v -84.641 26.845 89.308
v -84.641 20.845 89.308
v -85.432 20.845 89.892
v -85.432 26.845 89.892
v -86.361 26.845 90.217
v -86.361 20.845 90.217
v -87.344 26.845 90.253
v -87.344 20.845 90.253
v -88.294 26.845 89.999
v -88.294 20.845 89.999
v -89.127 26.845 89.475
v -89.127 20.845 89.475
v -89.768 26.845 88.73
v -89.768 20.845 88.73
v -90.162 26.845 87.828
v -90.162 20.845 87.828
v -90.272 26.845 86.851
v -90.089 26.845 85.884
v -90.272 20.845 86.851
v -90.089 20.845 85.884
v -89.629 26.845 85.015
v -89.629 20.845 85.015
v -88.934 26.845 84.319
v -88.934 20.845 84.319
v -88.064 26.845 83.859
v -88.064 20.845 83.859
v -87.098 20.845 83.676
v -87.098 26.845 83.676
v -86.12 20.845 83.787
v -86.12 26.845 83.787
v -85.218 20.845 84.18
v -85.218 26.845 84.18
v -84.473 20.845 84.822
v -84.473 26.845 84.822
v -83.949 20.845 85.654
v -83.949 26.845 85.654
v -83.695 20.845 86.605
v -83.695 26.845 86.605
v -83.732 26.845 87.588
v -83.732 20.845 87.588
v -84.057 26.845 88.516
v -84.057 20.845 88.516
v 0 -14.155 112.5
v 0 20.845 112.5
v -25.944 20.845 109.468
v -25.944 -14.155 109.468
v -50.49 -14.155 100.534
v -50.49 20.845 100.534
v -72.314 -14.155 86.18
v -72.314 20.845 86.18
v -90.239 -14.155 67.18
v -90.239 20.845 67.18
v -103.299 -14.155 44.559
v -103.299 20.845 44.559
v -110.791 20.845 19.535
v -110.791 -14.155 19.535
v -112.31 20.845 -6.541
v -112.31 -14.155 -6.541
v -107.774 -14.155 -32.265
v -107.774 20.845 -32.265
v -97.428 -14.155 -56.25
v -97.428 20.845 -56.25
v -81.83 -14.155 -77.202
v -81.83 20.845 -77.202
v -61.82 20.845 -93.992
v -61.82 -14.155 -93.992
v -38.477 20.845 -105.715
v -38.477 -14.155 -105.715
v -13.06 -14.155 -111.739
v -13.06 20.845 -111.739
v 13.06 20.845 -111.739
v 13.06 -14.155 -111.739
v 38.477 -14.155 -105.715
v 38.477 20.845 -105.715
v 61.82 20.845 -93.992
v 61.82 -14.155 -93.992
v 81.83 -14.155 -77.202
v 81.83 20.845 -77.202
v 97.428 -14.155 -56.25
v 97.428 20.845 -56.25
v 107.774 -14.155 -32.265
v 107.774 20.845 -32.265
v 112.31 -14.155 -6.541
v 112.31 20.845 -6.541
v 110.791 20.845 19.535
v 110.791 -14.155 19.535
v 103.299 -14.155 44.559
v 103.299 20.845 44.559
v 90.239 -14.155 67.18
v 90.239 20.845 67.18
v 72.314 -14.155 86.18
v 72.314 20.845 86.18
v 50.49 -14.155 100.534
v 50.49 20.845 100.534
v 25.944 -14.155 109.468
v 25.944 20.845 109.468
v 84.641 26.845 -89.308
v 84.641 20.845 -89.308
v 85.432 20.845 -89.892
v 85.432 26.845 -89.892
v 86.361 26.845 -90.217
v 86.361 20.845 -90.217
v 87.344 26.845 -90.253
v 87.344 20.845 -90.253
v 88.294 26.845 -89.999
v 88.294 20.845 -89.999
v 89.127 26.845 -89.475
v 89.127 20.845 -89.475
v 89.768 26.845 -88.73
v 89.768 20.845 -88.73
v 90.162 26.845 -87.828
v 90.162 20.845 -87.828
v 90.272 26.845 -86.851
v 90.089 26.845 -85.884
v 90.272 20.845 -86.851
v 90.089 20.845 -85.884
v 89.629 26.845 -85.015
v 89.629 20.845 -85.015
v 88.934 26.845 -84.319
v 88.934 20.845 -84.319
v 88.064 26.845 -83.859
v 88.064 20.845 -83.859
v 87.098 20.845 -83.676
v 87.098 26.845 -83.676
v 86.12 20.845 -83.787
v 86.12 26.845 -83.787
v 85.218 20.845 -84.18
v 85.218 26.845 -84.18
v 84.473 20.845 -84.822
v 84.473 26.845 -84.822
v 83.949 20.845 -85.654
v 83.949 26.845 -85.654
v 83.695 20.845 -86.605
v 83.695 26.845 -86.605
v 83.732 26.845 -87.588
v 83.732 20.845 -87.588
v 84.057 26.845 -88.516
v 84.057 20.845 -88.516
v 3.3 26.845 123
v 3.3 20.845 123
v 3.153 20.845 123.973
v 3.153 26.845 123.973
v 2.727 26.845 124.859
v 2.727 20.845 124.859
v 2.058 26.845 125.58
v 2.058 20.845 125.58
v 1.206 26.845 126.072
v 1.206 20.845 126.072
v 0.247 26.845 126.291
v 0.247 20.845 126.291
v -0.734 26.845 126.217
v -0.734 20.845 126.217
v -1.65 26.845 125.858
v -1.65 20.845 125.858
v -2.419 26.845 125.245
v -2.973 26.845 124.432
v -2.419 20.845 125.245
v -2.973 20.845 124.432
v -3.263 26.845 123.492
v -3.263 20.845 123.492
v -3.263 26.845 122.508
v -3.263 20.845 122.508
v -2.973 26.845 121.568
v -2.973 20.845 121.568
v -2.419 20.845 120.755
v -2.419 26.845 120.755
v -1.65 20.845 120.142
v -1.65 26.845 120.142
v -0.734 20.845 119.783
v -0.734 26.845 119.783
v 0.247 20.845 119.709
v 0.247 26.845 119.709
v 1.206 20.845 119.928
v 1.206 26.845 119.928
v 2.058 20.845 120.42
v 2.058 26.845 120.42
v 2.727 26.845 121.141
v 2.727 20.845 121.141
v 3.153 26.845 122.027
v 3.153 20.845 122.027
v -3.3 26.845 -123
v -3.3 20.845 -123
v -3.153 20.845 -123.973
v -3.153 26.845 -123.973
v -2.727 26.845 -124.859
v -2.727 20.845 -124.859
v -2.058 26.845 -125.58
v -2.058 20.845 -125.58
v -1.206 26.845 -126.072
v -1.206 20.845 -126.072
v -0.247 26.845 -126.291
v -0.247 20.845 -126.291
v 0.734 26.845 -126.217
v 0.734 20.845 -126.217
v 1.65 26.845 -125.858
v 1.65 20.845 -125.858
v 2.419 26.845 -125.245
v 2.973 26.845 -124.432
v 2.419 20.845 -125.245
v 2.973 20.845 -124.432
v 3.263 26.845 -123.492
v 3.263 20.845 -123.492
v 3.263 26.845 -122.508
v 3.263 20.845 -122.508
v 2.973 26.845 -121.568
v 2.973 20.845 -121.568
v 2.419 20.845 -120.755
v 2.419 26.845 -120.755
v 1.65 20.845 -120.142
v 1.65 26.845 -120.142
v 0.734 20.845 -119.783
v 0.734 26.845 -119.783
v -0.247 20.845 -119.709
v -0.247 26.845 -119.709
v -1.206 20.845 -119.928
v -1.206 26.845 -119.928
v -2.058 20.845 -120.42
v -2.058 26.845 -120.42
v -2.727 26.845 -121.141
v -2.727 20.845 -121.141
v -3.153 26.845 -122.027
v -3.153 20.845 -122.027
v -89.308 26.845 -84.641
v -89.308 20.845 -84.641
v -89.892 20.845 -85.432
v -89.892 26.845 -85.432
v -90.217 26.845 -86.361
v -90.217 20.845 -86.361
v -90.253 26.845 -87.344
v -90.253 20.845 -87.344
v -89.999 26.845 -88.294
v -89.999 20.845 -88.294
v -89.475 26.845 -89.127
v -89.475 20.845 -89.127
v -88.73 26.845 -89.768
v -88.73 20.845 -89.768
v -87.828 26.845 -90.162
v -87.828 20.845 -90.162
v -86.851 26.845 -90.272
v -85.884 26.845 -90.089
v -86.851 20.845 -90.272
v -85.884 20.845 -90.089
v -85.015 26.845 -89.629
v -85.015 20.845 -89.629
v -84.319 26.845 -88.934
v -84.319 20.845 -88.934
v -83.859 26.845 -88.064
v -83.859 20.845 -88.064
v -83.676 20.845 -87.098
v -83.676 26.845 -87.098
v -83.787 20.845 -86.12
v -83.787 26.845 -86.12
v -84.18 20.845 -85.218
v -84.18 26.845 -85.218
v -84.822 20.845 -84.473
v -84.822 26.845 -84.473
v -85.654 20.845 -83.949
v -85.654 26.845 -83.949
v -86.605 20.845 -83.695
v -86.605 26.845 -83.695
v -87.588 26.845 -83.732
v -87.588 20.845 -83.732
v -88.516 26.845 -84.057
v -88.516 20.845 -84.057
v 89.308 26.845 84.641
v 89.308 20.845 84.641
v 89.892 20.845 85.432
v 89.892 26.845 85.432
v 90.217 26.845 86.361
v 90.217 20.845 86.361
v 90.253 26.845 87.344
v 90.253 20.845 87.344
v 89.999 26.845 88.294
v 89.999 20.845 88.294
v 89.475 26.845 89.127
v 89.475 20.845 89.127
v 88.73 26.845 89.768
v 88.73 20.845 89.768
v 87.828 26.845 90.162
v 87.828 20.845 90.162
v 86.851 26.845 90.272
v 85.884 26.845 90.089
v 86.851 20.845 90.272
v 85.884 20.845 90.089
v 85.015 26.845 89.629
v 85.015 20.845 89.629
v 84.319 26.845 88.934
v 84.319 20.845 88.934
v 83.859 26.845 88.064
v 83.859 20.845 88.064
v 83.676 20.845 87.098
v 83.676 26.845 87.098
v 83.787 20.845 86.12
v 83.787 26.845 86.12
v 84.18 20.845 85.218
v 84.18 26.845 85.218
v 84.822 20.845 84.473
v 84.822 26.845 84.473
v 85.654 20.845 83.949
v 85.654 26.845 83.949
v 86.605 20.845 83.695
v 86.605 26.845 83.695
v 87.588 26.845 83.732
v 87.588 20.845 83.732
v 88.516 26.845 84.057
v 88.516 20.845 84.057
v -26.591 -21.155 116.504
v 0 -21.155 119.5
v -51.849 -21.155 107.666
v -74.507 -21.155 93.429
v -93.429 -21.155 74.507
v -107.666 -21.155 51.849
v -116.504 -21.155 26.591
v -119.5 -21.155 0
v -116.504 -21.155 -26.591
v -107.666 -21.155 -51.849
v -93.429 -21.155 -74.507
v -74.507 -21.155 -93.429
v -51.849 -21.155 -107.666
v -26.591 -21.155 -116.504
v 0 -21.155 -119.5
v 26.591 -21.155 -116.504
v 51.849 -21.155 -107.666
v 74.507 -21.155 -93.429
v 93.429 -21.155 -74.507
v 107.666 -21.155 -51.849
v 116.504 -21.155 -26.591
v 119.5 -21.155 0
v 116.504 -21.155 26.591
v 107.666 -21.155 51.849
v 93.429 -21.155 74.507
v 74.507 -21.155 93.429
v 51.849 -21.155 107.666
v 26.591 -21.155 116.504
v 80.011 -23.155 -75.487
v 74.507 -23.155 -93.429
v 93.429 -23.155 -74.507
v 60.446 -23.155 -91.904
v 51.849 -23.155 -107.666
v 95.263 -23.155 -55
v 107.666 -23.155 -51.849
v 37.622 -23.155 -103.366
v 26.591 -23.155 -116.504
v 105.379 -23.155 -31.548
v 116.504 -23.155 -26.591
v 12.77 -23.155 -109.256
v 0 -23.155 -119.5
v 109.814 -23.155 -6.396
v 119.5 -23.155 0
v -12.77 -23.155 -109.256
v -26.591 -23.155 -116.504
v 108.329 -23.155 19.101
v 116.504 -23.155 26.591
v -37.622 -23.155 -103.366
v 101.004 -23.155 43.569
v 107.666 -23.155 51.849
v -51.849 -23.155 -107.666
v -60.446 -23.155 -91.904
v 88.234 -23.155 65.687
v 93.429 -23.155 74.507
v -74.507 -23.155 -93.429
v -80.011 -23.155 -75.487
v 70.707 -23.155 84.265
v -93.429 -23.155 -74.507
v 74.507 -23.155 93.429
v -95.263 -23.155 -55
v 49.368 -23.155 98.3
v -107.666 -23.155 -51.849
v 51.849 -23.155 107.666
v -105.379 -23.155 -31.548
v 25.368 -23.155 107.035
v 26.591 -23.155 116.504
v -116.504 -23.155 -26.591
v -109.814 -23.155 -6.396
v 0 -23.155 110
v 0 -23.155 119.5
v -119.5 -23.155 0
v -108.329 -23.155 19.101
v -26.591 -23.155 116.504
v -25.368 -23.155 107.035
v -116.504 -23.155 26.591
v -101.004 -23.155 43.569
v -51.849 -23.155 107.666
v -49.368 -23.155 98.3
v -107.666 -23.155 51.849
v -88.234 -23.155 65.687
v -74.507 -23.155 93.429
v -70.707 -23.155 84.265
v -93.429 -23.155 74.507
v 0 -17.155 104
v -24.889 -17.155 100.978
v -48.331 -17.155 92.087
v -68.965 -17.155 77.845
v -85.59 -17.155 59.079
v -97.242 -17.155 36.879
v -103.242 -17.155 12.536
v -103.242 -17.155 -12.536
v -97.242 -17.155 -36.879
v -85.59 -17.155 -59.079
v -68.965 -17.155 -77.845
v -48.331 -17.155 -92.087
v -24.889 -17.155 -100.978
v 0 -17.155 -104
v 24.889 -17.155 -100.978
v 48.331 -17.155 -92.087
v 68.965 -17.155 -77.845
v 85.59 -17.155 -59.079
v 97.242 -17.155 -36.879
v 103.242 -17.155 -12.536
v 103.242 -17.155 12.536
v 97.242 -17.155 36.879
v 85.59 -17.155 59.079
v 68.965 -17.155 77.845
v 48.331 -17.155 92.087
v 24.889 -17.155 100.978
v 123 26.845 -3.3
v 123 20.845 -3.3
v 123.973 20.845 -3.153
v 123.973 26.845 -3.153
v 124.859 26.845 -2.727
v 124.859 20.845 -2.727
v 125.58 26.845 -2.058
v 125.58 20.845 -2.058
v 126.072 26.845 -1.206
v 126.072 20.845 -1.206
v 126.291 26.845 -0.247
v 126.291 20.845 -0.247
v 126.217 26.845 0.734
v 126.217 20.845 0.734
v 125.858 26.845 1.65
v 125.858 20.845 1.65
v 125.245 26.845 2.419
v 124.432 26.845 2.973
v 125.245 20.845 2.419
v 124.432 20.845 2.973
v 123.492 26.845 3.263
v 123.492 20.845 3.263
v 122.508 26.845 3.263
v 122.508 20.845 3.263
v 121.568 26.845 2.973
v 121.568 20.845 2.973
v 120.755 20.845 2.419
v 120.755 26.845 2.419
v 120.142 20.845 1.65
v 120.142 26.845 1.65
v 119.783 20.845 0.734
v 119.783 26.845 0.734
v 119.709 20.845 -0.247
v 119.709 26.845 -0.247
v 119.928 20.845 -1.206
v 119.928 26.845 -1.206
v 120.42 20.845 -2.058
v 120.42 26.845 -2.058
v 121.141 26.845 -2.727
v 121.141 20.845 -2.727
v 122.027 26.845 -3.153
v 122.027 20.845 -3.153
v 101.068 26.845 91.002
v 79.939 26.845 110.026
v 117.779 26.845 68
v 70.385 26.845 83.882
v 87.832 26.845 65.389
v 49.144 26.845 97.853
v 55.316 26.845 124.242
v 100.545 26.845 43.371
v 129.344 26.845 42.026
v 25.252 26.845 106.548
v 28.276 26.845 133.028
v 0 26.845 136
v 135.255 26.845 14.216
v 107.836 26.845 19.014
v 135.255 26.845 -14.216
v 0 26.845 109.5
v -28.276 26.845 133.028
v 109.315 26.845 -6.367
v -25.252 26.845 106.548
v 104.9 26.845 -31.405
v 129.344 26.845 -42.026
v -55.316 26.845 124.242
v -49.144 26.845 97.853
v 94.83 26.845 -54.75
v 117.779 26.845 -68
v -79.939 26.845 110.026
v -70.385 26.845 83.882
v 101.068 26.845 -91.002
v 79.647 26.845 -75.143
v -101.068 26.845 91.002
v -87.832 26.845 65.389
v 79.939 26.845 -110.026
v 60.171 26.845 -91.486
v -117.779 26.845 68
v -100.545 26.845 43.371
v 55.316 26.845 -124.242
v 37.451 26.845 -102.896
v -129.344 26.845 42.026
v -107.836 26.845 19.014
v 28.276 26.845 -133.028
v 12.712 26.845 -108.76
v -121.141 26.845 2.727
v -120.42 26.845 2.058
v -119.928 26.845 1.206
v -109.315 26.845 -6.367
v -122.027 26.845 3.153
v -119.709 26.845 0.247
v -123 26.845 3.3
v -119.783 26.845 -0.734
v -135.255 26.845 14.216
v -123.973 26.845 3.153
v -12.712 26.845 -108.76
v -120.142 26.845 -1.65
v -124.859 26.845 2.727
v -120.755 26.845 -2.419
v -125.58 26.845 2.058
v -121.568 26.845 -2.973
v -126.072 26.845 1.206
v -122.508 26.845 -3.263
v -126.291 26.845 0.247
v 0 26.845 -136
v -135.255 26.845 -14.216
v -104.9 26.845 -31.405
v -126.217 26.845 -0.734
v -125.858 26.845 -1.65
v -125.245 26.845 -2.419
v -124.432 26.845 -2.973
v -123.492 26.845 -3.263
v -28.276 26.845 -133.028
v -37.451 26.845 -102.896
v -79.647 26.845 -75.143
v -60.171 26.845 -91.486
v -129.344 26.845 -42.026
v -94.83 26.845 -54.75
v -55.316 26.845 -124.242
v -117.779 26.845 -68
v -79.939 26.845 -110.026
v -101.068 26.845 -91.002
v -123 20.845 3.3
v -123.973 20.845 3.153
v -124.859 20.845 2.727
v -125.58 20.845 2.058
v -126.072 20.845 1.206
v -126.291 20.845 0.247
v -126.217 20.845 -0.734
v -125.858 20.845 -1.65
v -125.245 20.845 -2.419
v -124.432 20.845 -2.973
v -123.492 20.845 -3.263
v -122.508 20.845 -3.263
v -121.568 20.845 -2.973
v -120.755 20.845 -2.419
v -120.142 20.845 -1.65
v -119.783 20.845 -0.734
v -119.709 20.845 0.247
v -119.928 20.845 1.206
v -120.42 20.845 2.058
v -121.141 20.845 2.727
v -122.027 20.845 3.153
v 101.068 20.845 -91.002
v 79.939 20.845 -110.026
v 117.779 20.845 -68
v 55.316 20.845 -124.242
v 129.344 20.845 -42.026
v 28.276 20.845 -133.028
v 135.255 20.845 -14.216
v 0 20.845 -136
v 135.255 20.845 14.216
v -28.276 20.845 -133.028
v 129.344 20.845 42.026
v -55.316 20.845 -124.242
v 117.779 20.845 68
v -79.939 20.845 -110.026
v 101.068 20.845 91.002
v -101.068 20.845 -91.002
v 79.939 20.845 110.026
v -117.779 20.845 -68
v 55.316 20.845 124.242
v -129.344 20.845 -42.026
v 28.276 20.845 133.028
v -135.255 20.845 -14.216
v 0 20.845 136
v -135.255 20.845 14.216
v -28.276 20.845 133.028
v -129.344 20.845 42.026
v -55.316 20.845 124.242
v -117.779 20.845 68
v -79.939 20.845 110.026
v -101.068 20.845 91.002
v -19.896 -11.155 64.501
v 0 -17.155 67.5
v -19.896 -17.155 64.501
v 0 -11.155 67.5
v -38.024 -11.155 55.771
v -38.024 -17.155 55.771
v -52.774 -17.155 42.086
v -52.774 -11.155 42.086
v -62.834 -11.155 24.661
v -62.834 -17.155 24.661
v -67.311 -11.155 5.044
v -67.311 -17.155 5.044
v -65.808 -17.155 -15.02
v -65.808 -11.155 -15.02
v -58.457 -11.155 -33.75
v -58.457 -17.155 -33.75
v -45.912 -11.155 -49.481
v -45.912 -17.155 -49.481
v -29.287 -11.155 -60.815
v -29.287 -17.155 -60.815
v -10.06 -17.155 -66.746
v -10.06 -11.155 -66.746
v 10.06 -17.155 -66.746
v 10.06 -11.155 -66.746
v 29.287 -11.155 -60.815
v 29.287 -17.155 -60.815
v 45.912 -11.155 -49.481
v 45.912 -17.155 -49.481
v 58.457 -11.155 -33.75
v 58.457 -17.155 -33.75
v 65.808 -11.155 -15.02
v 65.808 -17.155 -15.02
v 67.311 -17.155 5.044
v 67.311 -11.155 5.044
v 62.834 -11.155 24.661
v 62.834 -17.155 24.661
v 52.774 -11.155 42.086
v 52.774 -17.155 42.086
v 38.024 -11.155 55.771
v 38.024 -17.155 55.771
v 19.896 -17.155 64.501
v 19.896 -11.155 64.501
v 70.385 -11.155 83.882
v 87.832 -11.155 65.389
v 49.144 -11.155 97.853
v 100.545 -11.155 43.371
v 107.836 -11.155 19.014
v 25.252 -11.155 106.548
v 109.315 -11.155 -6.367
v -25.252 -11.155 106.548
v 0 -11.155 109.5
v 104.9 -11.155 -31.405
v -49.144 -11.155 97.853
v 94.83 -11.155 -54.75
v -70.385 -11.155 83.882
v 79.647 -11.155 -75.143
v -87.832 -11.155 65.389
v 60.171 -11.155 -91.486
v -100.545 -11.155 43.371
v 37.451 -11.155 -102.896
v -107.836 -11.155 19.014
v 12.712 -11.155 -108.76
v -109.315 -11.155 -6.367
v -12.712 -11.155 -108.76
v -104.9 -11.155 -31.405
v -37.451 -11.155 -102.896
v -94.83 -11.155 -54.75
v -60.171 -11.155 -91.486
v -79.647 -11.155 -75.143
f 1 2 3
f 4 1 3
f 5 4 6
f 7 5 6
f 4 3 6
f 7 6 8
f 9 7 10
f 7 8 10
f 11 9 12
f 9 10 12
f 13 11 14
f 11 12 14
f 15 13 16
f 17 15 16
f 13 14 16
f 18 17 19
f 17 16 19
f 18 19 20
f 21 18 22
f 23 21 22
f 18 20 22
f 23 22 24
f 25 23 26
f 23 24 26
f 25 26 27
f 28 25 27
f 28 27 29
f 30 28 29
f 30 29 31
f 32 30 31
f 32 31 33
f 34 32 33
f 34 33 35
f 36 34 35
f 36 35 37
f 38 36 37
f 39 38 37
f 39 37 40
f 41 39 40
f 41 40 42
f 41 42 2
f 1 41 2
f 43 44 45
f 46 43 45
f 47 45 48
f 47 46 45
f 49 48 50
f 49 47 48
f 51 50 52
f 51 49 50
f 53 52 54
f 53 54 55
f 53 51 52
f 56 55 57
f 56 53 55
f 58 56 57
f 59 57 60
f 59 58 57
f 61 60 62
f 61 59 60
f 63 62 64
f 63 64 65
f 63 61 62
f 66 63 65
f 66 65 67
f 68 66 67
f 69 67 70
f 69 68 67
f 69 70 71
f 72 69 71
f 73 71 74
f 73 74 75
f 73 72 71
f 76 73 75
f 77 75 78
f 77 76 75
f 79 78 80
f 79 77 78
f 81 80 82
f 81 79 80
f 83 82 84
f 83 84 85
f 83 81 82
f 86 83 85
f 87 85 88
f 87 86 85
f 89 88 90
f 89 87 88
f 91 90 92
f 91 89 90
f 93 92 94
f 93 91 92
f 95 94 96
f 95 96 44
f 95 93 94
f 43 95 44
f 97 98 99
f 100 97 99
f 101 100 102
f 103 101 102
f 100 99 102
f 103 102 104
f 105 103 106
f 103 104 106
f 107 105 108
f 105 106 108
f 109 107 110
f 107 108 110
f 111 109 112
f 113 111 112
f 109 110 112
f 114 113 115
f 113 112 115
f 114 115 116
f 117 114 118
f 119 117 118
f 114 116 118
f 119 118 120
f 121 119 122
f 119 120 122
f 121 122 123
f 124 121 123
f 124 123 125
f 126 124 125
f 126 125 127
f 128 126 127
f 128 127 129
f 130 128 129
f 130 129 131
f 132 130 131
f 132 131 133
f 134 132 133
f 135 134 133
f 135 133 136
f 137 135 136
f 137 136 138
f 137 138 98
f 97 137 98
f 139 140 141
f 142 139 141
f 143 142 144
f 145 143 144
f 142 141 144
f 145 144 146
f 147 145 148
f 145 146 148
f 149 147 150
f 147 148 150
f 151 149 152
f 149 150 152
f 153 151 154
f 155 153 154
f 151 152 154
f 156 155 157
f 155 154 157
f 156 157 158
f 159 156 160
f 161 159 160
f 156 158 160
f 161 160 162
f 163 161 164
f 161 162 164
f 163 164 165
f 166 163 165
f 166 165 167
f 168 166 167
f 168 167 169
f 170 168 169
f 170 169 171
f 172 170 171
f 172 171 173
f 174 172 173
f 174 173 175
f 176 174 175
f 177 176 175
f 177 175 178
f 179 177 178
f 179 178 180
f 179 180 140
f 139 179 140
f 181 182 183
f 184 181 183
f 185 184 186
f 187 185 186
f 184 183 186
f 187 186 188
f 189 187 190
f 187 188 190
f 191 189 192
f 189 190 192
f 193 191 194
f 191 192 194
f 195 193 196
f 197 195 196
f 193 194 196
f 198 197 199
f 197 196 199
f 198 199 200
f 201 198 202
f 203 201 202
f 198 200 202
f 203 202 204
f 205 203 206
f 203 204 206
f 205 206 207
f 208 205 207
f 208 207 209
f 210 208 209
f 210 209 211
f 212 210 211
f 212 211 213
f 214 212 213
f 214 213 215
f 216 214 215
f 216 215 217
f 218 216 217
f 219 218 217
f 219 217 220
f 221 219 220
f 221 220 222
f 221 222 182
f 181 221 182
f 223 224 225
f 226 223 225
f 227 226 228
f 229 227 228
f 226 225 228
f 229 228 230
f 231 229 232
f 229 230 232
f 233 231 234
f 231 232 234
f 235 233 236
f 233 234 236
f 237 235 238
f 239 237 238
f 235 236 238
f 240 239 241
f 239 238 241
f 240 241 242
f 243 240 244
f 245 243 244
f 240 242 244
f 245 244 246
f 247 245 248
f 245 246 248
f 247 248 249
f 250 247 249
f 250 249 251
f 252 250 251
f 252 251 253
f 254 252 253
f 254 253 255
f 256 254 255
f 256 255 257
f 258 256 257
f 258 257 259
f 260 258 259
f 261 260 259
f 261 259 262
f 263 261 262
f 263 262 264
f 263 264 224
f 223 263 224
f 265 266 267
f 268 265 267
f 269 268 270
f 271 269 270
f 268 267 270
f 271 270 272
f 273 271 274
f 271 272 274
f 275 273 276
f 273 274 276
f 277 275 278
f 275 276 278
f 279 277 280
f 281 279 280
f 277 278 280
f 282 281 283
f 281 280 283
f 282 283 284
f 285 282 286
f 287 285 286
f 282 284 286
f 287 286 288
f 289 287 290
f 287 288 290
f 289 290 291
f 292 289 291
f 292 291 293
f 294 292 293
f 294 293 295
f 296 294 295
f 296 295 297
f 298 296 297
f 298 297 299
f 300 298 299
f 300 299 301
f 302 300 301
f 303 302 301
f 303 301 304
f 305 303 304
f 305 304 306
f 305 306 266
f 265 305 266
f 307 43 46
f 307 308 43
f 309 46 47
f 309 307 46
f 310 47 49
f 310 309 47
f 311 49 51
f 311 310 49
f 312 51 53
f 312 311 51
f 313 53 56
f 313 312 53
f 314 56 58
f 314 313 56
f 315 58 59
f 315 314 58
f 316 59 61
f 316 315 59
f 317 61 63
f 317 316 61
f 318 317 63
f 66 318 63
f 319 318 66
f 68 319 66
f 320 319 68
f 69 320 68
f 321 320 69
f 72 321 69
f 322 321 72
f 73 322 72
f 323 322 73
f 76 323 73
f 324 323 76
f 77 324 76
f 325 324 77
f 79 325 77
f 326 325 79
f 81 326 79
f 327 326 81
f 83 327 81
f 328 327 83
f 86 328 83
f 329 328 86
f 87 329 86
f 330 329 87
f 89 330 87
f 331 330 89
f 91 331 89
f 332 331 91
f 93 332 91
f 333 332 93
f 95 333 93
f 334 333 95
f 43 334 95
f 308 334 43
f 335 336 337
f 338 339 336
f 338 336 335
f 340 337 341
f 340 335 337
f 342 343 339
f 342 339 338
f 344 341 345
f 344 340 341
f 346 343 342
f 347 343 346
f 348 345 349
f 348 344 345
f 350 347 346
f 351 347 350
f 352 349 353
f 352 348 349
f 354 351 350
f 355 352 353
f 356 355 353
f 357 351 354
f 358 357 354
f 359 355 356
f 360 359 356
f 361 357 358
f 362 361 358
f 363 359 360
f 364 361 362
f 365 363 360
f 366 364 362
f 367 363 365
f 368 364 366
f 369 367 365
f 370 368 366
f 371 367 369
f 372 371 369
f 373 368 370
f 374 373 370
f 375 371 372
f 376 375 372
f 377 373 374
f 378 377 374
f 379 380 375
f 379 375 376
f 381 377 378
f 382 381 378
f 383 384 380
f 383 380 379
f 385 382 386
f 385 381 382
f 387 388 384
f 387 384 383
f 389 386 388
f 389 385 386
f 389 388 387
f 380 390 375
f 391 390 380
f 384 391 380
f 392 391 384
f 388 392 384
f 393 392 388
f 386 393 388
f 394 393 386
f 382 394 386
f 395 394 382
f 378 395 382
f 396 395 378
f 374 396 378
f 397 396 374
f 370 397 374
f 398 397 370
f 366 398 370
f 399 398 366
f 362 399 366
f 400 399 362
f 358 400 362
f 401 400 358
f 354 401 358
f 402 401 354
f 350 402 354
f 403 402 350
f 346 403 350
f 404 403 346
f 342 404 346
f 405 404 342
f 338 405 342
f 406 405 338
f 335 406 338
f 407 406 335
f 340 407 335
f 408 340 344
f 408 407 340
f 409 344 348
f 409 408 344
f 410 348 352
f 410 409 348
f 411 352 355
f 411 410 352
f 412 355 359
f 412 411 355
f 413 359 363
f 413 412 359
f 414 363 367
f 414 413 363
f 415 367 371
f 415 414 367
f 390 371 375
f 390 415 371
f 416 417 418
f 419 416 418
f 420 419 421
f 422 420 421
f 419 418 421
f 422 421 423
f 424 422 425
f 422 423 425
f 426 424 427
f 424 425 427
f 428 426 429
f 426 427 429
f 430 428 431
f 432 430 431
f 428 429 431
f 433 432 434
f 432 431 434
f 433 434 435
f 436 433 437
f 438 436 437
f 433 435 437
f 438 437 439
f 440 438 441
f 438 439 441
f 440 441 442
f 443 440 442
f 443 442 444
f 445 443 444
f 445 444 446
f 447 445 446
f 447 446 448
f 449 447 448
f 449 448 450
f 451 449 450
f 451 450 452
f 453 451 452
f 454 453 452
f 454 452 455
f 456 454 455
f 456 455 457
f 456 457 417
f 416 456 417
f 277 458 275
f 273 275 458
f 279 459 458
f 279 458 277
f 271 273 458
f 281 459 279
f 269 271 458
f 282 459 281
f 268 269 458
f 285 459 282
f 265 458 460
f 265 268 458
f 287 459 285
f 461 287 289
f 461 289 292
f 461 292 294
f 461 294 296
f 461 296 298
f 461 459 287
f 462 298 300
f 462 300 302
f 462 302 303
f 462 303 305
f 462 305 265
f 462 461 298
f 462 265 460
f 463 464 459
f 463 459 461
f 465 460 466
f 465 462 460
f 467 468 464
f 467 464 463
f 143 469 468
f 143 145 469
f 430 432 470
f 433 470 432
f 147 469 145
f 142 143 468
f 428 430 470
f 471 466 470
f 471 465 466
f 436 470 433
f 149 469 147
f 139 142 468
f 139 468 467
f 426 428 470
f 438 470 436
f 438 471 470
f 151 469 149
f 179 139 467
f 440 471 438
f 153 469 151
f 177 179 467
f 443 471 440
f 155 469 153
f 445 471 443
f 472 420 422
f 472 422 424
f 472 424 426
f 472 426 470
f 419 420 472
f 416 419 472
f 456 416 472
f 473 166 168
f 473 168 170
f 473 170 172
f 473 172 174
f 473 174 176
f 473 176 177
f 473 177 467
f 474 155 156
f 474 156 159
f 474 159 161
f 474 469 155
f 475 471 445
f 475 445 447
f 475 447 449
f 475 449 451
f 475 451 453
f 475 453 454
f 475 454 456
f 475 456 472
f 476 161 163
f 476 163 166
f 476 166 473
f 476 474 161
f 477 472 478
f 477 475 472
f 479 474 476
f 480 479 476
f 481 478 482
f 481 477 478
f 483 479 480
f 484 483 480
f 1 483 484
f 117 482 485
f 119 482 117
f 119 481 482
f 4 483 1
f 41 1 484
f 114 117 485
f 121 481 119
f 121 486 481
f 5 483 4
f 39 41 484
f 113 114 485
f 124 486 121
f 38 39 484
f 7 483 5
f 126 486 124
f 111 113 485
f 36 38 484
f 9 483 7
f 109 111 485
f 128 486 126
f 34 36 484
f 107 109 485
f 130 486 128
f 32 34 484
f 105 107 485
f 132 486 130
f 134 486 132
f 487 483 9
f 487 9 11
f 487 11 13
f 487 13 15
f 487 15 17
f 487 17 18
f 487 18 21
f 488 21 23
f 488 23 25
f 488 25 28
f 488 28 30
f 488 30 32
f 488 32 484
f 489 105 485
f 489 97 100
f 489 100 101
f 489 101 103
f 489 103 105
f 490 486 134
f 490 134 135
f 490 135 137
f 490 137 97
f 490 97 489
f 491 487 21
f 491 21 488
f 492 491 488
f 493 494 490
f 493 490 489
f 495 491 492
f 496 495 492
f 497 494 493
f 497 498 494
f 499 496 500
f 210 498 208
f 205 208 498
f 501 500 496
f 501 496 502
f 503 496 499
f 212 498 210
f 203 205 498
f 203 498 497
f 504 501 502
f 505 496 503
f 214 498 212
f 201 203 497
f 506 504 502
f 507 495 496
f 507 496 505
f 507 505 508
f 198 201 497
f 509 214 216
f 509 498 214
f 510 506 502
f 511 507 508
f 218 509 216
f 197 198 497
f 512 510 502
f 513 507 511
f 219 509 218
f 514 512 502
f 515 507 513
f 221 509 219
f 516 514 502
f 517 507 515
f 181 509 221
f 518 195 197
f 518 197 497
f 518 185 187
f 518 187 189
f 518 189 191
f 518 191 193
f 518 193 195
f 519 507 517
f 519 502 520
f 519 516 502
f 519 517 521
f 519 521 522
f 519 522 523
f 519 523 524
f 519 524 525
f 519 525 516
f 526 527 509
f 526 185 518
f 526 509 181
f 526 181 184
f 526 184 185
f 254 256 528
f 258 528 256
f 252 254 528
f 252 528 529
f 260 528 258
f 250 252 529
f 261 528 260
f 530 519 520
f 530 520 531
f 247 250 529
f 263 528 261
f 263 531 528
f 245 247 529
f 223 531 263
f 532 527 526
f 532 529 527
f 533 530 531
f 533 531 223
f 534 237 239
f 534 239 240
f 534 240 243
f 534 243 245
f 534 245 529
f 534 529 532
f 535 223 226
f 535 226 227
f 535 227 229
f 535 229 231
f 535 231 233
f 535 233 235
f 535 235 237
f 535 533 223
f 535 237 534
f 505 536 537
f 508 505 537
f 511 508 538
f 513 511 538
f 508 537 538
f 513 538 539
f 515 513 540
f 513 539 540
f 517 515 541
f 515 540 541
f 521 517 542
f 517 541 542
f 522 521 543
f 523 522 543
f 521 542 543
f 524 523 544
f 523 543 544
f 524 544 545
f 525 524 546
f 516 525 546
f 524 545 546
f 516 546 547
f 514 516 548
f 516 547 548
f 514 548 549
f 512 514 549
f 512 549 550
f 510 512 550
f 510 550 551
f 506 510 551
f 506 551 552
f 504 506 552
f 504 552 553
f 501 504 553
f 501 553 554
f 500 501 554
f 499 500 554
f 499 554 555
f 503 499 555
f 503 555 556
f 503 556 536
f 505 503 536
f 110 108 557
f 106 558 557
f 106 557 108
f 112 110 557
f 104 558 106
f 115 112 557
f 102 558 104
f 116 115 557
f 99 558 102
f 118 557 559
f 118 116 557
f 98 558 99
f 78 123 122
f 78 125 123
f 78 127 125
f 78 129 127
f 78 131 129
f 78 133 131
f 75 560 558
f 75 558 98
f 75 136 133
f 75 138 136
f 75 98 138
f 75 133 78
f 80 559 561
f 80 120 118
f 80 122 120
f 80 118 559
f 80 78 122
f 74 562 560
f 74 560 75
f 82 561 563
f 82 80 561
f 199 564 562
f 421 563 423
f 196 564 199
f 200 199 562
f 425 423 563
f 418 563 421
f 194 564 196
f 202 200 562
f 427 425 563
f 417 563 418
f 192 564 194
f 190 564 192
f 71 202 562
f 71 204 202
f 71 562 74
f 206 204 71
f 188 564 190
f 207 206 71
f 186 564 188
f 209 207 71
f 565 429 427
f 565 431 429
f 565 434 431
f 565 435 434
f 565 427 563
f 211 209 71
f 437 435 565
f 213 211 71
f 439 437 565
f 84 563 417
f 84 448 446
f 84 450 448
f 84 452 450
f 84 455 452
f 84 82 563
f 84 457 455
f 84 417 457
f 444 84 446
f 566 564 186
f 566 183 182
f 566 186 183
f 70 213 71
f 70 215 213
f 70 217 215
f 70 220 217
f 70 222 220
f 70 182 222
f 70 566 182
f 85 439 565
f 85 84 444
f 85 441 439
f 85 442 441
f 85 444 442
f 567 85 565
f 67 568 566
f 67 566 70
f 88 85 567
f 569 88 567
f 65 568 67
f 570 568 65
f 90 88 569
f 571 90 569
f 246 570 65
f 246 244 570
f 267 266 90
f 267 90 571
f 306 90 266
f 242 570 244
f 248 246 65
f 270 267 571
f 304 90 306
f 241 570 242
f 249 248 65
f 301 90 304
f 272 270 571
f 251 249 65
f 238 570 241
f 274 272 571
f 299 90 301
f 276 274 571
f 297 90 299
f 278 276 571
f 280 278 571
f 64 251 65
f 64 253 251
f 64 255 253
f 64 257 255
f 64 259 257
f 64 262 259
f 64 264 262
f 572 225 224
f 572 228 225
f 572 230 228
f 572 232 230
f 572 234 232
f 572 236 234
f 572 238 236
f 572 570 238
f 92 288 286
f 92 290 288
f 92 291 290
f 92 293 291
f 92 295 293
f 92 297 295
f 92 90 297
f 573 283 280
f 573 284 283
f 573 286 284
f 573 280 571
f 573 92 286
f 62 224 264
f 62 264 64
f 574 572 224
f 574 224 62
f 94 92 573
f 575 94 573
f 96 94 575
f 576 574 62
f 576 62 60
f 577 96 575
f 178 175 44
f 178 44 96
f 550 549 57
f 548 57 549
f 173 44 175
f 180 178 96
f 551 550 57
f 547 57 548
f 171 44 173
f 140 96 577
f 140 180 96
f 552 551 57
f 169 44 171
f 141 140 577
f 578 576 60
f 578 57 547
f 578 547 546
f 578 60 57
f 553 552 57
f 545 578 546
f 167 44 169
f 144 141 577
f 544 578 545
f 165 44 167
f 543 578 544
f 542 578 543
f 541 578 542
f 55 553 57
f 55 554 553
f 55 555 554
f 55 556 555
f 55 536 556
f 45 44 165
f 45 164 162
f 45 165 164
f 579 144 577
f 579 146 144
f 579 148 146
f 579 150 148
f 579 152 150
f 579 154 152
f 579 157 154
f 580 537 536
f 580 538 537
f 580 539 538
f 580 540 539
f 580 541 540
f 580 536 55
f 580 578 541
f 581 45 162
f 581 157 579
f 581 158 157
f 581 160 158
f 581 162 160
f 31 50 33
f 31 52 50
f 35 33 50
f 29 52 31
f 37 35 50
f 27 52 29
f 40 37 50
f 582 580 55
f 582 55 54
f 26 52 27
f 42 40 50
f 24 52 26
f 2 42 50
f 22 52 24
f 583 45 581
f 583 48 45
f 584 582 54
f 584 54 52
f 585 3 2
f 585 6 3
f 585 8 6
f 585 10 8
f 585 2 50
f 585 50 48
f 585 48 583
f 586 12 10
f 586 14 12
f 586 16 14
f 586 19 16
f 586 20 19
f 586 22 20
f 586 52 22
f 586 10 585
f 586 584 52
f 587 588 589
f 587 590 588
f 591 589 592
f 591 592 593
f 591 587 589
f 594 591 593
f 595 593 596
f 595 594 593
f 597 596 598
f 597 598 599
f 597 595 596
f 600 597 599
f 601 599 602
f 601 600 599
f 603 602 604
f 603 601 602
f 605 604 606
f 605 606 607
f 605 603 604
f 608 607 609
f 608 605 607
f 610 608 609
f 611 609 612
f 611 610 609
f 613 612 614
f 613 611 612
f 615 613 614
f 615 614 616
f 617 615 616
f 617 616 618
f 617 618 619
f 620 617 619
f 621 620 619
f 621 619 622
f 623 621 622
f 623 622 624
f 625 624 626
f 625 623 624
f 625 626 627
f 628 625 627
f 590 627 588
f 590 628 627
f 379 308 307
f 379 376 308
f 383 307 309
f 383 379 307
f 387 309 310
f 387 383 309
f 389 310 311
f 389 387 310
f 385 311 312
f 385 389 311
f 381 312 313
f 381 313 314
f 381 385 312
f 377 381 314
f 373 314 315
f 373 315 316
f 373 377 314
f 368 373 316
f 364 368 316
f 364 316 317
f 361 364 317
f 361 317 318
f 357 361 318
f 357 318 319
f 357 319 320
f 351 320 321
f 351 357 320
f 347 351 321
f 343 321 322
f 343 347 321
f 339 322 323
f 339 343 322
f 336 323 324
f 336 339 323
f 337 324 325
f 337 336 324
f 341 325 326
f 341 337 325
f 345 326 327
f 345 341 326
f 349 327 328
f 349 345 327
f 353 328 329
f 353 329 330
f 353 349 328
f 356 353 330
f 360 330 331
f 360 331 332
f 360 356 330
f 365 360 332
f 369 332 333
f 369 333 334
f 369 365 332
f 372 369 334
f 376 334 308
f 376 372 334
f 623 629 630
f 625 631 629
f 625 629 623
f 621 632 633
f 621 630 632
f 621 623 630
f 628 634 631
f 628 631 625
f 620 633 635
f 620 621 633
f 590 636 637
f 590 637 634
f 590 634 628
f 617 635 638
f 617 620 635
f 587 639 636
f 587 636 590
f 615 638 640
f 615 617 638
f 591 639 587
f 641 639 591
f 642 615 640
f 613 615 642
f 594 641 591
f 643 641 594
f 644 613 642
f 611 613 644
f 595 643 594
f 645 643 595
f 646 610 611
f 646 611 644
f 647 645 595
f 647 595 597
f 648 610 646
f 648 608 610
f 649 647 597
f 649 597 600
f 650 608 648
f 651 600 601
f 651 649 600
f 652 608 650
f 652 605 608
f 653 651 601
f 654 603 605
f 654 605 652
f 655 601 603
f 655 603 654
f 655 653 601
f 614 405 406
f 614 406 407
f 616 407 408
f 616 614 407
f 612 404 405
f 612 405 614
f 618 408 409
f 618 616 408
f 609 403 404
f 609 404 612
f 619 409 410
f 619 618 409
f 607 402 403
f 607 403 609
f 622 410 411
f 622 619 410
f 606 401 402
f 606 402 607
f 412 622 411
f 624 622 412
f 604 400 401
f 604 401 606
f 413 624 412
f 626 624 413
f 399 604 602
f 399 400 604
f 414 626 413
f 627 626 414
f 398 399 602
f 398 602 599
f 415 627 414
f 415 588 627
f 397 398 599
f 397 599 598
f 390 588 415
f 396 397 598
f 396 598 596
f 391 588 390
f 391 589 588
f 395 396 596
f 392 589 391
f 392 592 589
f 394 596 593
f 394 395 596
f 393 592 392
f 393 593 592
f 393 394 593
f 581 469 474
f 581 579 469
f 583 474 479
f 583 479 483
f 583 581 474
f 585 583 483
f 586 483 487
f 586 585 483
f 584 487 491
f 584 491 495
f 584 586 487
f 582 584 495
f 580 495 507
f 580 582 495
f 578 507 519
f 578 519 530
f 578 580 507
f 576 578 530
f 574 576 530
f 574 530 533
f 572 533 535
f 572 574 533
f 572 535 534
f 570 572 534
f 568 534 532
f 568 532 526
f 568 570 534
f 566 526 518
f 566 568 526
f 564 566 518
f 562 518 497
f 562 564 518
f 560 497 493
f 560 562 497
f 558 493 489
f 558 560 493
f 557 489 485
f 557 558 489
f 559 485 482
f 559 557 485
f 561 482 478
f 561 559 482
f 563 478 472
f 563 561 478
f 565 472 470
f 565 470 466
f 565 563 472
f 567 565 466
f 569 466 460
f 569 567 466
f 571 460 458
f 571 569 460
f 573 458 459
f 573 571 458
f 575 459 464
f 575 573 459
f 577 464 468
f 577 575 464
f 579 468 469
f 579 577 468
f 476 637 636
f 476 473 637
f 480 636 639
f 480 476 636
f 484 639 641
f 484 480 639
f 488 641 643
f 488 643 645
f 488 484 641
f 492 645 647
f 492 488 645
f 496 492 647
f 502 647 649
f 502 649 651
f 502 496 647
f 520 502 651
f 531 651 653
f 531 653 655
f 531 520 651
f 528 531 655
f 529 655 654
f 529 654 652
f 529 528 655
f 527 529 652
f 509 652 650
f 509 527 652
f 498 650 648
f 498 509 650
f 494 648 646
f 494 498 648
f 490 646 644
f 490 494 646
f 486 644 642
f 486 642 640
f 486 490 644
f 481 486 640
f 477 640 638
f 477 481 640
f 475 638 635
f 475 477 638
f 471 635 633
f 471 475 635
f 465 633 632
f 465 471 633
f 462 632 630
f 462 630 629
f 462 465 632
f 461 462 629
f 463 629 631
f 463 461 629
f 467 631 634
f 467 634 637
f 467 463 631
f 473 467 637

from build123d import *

# Parameters (mm, degrees)
SKETCH_2_R               = 3.3
BASE_PLATE_M6_DEPTH      = 198.301799282
PATTERN_CIRCULAR_1_COUNT = 8


with BuildPart() as part:
    # ｽｹｯﾁ1 → 回転1 (revolve)
    with BuildSketch(Plane.XY, mode=Mode.PRIVATE) as revolve_1_sk:
        Polygon((-109.5, 26.845447074), (-136, 26.845447074), (-136, 20.845447074), (-112.5, 20.845447074), (-112.5, -14.154552926), (-119.5, -21.154552926), (-119.5, -23.154552926), (-110, -23.154552926), (-104, -17.154552926), (-67.5, -17.154552926), (-67.5, -11.154552926), (-109.5, -11.154552926), align=None)
    revolve(revolve_1_sk.sketch.rotate(Axis((0, 100.817249739, 0), (0, -1, 0)), 270), axis=Axis((0, 100.817249739, 0), (0, -1, 0)))

    # ｽｹｯﾁ2 → Base_Plateへの固定用穴(M6の六角ボルトを使用) (cut, through all)
    with BuildSketch(Plane.XZ.offset(-20.845447074)):
        with Locations(Location((123, 0, 0), (0, 0, 270))):
            Circle(SKETCH_2_R)
    base_plate_m6 = extrude(amount=-BASE_PLATE_M6_DEPTH, mode=Mode.SUBTRACT)

    # 円形ﾊﾟﾀｰﾝ1: Base_Plateへの固定用穴(M6の六角ボルトを使用) ×8 about axis
    pattern_circular_1_axis = Axis((0, 0, 0), (0, 1, 0))
    for i in range(1, PATTERN_CIRCULAR_1_COUNT):
        add(base_plate_m6.rotate(pattern_circular_1_axis, i * 360 / PATTERN_CIRCULAR_1_COUNT), mode=Mode.SUBTRACT)


solid = part.part
